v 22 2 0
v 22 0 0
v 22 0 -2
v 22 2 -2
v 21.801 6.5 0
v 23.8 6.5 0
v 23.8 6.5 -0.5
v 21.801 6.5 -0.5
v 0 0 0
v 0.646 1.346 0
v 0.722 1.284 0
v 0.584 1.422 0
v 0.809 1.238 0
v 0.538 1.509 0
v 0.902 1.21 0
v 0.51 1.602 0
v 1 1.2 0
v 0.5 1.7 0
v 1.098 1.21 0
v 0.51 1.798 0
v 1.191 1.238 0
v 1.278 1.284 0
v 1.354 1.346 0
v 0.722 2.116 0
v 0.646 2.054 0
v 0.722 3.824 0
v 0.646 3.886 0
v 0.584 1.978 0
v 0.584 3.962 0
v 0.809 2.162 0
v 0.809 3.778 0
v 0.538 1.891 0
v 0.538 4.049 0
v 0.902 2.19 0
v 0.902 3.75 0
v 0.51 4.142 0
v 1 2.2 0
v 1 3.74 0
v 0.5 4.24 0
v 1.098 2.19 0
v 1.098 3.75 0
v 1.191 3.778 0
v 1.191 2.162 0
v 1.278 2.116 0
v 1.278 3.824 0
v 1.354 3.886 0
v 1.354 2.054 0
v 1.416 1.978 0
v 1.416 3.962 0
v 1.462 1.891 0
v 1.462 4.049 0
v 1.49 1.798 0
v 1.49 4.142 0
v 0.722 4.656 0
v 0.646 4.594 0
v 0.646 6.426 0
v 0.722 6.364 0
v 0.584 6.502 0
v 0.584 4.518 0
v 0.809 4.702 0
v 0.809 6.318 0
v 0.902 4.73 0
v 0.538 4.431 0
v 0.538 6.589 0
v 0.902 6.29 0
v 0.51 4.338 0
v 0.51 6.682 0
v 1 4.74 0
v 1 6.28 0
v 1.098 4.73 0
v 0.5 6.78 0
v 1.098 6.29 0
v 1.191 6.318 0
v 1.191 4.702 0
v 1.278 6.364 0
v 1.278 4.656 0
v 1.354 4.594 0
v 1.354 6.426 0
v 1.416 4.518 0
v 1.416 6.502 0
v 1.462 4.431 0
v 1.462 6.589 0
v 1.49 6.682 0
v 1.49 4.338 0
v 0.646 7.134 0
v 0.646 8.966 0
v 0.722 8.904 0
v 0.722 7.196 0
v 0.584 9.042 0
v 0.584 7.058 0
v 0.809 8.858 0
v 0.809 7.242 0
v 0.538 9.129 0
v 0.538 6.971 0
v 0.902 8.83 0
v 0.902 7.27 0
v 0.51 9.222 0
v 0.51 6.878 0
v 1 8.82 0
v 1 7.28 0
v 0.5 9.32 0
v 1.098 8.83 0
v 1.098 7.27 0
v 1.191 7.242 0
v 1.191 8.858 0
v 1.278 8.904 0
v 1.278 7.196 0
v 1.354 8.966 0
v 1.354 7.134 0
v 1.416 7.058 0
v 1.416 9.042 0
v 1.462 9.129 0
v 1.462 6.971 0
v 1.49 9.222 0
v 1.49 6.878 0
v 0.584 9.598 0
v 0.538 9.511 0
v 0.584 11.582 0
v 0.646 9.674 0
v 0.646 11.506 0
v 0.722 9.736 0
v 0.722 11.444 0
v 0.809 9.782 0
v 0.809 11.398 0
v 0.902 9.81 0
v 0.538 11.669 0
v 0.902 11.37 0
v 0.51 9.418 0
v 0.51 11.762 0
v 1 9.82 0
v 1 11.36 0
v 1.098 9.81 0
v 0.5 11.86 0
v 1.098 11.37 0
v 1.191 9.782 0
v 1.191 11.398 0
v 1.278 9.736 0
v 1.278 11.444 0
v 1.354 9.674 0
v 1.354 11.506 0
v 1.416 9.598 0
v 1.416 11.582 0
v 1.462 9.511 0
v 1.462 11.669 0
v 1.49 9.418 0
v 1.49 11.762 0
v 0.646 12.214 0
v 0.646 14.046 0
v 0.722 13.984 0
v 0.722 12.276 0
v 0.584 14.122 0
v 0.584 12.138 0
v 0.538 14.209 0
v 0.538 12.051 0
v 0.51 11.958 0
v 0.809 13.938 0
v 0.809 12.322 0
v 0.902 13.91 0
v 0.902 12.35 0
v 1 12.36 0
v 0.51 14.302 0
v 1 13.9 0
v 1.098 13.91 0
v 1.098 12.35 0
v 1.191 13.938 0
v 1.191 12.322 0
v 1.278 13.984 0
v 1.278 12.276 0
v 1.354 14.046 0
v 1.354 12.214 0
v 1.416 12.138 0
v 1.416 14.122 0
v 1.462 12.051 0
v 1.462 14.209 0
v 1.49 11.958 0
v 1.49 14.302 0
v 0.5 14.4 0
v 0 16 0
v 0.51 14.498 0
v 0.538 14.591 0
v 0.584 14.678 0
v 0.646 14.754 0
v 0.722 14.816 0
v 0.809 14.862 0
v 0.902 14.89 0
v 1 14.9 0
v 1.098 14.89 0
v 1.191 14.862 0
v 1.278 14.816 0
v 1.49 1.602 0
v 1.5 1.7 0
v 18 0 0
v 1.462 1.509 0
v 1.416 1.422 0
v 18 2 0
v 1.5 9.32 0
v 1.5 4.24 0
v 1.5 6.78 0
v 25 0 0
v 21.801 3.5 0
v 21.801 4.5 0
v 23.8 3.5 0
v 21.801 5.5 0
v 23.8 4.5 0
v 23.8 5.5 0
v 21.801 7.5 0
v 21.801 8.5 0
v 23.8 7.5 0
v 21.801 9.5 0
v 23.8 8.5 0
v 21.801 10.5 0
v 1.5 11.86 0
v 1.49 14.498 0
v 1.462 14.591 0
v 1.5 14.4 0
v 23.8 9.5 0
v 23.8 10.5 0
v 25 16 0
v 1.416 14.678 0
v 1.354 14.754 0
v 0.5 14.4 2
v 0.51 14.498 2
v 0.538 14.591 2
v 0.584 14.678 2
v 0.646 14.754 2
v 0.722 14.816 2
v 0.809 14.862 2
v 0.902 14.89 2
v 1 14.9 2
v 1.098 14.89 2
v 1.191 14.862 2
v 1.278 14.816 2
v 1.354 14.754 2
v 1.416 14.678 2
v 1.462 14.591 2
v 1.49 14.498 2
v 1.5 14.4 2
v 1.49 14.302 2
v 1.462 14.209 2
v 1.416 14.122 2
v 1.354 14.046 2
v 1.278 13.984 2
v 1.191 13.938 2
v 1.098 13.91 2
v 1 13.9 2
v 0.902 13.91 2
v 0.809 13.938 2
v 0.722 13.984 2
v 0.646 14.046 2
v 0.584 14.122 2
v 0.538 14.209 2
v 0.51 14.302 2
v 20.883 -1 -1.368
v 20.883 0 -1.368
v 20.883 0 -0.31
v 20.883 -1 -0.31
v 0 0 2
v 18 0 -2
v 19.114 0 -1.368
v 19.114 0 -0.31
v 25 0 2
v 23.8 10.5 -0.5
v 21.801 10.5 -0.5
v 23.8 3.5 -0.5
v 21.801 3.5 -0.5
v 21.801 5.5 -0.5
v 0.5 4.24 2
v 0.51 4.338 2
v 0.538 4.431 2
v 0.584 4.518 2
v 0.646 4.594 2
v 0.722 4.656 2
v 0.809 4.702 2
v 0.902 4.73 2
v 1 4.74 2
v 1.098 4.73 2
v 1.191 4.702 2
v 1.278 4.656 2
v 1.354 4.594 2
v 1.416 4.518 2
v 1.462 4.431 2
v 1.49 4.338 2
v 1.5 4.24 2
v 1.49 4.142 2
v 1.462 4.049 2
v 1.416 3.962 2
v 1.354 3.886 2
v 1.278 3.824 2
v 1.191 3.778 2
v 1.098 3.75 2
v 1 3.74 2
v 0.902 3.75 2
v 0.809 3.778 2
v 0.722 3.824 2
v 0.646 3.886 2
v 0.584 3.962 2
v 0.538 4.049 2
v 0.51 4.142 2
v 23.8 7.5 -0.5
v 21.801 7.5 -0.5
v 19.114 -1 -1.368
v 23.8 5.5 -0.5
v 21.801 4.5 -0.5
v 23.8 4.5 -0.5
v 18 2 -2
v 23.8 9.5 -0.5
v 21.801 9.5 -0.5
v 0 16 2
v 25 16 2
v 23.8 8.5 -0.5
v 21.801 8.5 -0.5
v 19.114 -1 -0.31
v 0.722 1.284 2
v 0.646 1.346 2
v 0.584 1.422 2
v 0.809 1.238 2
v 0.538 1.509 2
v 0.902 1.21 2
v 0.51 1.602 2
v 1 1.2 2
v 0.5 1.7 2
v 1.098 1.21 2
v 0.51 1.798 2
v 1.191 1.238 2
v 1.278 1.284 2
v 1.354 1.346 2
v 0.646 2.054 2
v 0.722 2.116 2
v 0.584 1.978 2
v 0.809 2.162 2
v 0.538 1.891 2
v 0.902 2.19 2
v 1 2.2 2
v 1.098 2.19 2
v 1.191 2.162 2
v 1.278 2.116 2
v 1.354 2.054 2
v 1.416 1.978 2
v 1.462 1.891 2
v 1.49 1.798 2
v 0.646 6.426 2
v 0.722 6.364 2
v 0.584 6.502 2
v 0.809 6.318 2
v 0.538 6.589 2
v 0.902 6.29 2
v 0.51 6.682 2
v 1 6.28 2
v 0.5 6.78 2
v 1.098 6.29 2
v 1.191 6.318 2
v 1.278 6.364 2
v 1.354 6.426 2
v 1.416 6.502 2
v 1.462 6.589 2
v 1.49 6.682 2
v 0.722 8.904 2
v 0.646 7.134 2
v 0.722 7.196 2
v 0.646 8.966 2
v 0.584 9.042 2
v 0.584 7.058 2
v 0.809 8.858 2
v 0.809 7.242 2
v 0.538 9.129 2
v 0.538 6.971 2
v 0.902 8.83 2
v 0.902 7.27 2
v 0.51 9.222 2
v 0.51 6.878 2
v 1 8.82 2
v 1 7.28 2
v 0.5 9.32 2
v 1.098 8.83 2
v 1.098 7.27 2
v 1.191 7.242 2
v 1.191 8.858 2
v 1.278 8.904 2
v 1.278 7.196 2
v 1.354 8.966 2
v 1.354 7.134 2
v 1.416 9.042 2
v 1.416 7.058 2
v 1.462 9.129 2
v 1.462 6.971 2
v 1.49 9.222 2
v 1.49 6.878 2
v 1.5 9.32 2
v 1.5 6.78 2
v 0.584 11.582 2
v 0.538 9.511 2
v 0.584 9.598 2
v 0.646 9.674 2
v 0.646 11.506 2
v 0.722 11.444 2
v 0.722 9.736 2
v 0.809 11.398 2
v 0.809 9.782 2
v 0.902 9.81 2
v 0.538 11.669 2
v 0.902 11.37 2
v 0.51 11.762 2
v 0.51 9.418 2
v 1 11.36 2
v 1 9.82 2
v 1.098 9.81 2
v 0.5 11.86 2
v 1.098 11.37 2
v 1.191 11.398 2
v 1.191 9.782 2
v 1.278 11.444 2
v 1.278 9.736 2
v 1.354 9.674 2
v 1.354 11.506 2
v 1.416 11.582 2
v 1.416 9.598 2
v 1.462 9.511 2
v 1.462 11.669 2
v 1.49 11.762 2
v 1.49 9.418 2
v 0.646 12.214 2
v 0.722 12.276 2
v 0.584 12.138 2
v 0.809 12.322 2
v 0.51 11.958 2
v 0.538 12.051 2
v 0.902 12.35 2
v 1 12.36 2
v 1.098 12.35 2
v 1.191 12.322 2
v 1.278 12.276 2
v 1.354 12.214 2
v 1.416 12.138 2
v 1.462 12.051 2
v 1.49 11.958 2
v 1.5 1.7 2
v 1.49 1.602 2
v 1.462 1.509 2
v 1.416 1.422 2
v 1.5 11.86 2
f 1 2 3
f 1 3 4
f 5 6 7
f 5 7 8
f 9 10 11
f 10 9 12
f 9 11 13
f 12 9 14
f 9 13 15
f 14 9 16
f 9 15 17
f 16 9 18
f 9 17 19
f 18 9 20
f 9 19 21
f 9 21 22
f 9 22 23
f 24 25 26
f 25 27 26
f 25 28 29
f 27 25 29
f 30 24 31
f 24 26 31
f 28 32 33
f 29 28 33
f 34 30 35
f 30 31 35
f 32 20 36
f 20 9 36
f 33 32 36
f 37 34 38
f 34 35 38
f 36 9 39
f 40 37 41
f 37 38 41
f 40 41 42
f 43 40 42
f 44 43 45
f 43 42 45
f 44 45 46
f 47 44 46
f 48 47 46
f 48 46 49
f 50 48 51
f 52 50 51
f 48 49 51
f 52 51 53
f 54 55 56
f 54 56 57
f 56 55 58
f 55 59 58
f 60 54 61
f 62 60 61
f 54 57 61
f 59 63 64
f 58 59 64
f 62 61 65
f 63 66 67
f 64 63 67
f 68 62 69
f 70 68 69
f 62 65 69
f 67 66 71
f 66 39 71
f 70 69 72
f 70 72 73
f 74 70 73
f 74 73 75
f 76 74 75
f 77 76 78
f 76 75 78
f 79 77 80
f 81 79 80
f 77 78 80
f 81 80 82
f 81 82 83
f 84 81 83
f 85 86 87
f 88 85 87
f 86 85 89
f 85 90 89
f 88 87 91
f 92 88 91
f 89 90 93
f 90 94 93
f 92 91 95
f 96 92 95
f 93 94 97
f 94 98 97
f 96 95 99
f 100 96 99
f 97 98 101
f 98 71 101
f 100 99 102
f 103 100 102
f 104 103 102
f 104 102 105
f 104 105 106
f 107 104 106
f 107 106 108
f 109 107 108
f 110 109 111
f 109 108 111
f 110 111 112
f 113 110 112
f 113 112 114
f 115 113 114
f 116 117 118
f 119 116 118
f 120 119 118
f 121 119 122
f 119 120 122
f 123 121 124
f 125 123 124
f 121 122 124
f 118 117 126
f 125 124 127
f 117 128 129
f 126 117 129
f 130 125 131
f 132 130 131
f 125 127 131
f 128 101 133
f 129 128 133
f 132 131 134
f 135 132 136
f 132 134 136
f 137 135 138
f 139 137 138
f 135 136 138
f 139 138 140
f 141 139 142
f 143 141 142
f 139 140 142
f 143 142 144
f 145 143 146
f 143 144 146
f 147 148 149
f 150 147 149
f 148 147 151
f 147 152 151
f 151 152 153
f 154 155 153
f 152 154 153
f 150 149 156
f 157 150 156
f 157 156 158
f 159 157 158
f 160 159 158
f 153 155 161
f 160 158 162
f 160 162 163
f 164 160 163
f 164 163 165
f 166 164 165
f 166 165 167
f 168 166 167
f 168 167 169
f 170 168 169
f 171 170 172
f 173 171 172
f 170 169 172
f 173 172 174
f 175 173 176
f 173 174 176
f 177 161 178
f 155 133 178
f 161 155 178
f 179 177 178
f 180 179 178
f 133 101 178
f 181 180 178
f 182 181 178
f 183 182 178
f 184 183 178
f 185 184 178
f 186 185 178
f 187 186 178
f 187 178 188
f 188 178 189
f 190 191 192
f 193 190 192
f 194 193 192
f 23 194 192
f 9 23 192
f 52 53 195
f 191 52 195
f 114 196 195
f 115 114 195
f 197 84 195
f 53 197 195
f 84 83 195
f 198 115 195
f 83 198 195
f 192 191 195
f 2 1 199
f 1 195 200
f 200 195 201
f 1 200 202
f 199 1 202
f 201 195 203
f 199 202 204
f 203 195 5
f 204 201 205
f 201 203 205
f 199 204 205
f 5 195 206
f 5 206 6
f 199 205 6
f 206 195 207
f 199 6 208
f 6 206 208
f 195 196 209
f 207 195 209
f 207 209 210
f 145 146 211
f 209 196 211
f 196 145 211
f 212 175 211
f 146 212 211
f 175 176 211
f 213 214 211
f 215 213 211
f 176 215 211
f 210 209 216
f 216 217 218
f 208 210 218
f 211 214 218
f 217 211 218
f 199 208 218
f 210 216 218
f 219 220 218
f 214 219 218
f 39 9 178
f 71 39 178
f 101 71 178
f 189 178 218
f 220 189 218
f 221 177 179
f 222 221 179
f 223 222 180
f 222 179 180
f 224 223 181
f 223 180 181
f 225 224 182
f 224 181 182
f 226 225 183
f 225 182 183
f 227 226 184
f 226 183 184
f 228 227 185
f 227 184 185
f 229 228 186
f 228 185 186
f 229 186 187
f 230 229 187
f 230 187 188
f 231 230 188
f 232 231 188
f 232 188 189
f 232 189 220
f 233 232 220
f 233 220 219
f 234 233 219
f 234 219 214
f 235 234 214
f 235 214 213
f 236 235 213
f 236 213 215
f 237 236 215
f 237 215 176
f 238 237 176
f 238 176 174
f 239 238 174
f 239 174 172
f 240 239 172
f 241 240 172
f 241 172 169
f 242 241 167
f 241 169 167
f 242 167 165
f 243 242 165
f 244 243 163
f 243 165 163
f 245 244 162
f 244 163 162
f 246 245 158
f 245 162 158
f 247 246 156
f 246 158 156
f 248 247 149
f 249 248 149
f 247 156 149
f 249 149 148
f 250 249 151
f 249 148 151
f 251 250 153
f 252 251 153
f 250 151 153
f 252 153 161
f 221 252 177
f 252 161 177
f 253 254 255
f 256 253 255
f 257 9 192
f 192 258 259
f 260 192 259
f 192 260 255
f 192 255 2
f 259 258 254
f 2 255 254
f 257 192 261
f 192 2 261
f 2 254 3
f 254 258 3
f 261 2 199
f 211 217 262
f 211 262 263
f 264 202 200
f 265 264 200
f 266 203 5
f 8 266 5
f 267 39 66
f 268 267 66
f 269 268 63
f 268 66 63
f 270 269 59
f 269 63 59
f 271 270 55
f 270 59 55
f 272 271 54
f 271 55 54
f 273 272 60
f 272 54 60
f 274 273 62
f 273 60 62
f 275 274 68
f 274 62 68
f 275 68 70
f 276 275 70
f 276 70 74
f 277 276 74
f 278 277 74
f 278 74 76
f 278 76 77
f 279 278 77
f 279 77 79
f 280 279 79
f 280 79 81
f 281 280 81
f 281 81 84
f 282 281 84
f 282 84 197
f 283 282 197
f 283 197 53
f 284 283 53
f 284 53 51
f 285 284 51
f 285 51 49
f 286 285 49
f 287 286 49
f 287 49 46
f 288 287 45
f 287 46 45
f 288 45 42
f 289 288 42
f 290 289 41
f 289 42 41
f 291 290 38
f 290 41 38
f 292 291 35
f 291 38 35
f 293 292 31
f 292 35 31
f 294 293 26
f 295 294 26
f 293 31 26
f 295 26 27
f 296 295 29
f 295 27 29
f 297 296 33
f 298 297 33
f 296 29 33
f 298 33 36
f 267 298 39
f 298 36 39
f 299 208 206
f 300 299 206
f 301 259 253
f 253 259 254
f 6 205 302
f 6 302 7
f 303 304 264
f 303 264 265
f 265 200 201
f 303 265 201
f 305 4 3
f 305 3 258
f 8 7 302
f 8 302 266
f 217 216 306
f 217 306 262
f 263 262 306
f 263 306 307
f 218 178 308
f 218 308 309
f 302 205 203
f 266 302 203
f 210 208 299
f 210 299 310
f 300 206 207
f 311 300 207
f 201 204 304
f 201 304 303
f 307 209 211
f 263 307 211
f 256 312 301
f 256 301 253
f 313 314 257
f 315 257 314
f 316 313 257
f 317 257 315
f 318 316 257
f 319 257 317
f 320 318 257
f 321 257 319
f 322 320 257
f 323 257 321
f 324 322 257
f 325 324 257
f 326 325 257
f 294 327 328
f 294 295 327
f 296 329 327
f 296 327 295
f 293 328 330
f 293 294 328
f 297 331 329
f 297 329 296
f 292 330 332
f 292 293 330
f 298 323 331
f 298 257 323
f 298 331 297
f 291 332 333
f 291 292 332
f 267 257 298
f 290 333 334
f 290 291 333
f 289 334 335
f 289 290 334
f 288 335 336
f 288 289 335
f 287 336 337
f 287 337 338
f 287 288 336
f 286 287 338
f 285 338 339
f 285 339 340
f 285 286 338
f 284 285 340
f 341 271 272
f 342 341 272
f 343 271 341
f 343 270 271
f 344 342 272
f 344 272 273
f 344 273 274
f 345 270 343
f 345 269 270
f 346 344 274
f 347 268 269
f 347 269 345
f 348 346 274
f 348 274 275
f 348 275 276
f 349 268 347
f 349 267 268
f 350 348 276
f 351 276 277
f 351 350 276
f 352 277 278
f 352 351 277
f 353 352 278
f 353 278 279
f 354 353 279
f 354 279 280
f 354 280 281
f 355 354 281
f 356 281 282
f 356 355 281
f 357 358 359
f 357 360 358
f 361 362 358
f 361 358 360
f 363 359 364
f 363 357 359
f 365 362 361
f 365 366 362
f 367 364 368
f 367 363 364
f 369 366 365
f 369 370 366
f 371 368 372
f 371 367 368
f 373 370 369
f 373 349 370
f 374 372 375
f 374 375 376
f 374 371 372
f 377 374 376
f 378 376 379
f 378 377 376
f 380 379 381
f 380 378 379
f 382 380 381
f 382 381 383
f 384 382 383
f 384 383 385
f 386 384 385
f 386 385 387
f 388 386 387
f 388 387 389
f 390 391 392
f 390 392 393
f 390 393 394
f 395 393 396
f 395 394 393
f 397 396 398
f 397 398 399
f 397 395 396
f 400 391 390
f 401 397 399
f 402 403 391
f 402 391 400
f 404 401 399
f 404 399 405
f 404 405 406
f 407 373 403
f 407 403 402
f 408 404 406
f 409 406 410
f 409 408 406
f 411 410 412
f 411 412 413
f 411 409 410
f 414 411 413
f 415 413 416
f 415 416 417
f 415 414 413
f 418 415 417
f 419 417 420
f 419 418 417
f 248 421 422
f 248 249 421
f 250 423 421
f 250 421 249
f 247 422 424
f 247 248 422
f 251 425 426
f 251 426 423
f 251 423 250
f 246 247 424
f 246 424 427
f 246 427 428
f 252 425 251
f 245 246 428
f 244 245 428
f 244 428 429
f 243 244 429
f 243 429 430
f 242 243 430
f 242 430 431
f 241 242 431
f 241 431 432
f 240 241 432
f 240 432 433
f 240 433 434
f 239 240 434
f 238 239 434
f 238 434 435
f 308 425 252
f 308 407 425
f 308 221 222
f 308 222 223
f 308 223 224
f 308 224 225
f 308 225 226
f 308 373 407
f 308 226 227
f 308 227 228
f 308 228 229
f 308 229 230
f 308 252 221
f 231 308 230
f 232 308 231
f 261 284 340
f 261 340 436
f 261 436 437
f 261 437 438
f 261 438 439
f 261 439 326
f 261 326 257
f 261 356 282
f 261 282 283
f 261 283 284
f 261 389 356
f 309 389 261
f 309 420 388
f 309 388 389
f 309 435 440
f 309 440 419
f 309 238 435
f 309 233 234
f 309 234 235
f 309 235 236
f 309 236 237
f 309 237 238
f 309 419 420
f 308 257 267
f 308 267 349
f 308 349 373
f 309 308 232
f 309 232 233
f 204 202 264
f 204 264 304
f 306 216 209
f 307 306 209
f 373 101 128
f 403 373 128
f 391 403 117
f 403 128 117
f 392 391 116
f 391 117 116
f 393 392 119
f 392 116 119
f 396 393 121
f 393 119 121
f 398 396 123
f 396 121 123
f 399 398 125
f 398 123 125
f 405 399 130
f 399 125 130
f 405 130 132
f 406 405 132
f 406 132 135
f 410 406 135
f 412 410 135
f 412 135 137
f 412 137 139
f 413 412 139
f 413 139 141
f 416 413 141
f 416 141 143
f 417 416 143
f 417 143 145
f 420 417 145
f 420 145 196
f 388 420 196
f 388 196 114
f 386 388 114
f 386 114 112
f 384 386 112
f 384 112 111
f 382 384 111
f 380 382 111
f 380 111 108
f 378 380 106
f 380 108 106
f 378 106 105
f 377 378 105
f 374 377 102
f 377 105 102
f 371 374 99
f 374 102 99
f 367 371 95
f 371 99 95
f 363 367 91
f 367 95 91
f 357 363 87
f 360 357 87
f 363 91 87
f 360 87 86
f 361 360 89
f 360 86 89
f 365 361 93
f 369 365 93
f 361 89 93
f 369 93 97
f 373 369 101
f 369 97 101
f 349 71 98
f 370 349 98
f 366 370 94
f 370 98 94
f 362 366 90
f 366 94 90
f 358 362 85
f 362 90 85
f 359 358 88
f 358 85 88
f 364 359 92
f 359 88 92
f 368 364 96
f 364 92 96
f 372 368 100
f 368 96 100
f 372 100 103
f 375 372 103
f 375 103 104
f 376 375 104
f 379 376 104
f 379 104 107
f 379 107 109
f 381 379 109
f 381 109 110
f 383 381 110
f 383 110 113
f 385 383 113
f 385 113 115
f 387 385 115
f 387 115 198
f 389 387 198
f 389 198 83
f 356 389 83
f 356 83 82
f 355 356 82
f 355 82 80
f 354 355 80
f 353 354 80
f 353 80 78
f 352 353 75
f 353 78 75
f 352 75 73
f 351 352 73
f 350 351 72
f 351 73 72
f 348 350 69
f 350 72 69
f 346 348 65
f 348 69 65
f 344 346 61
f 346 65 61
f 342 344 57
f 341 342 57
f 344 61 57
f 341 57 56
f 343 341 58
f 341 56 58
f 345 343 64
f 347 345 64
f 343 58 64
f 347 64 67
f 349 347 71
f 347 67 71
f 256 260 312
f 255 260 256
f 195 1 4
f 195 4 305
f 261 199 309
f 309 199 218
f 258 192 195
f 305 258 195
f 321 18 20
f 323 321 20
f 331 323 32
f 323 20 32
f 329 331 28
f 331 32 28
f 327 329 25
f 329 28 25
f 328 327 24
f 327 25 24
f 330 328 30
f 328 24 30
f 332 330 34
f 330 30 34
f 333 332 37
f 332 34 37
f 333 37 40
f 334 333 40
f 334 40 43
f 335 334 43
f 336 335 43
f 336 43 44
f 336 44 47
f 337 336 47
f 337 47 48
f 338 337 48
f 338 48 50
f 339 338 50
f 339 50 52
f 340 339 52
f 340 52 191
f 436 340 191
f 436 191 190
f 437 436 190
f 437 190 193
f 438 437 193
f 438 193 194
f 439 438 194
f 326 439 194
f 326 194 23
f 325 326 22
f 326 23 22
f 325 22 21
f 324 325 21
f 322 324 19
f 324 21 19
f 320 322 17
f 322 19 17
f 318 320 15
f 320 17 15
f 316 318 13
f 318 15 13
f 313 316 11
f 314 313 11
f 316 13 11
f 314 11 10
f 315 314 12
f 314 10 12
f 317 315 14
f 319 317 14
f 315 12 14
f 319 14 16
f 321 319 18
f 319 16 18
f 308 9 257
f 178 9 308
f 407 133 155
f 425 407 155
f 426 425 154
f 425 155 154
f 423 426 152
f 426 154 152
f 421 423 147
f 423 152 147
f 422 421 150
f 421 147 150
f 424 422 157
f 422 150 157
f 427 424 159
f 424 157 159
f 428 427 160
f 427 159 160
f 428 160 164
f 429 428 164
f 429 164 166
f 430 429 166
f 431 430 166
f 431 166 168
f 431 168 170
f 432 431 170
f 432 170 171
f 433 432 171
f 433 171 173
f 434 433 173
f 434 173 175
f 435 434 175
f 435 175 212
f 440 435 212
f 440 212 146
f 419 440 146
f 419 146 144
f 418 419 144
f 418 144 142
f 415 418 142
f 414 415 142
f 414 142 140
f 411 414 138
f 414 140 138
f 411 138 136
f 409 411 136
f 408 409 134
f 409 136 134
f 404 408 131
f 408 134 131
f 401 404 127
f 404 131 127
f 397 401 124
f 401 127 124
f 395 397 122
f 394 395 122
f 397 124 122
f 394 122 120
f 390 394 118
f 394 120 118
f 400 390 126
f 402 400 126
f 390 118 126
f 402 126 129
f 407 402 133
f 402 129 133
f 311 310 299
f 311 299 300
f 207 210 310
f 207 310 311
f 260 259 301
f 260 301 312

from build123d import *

# Parameters (mm, degrees)
SKETCH_1_W          = 25
SKETCH_1_H          = 16
EXTRUDE_1_DEPTH     = 2
SKETCH_2_R          = 0.5
CUT_EXTRUDE_1_DEPTH = 3
SKETCH_3_W          = 1.998432602
SKETCH_3_H          = 1
EXTRUDE_2_DEPTH     = 0.5
SKETCH_4_W          = 4
SKETCH_4_H          = 2
EXTRUDE_3_DEPTH     = 2
SKETCH_5_W          = 1.76862678
SKETCH_5_H          = 1.058923041
EXTRUDE_4_DEPTH     = 1


with BuildPart() as part:
    # 草图1 → 凸台-拉伸1 (new body)
    with BuildSketch(Plane.XY):
        with Locations((12.5, 8)):
            Rectangle(SKETCH_1_W, SKETCH_1_H)
    extrude(amount=EXTRUDE_1_DEPTH)

    # 草图2 → 切除-拉伸1 (cut, through all)
    with BuildSketch(Plane(origin=(0, 0, 0), x_dir=(-1, 0, 0), z_dir=(0, 0, -1))):
        with Locations((-1, 14.4)):
            Circle(SKETCH_2_R)
        with Locations((-1, 11.86)):
            Circle(SKETCH_2_R)
        with Locations((-1, 9.32)):
            Circle(SKETCH_2_R)
        with Locations((-1, 6.78)):
            Circle(SKETCH_2_R)
        with Locations((-1, 4.24)):
            Circle(SKETCH_2_R)
        with Locations((-1, 1.7)):
            Circle(SKETCH_2_R)
    extrude(amount=-CUT_EXTRUDE_1_DEPTH, mode=Mode.SUBTRACT)

    # 草图3 → 凸台-拉伸2 (add)
    with BuildSketch(Plane(origin=(0, 0, 0), x_dir=(-1, 0, 0), z_dir=(0, 0, -1))):
        with Locations((-22.800563102, 10)):
            Rectangle(SKETCH_3_W, SKETCH_3_H)
        with Locations((-22.800563102, 8)):
            Rectangle(SKETCH_3_W, SKETCH_3_H)
        with Locations((-22.800563102, 6)):
            Rectangle(SKETCH_3_W, SKETCH_3_H)
        with Locations((-22.800563102, 4)):
            Rectangle(SKETCH_3_W, SKETCH_3_H)
    extrude(amount=EXTRUDE_2_DEPTH)

    # 草图4 → 凸台-拉伸3 (add)
    with BuildSketch(Plane(origin=(0, 0, 0), x_dir=(-1, 0, 0), z_dir=(0, 0, -1))):
        with Locations((-20, 1)):
            Rectangle(SKETCH_4_W, SKETCH_4_H)
    extrude(amount=EXTRUDE_3_DEPTH)

    # 草图5 → 凸台-拉伸4 (add)
    with BuildSketch(Plane.XZ):
        with Locations((19.9984492, -0.838988802)):
            Rectangle(SKETCH_5_W, SKETCH_5_H)
    extrude(amount=EXTRUDE_4_DEPTH)


solid = part.part
